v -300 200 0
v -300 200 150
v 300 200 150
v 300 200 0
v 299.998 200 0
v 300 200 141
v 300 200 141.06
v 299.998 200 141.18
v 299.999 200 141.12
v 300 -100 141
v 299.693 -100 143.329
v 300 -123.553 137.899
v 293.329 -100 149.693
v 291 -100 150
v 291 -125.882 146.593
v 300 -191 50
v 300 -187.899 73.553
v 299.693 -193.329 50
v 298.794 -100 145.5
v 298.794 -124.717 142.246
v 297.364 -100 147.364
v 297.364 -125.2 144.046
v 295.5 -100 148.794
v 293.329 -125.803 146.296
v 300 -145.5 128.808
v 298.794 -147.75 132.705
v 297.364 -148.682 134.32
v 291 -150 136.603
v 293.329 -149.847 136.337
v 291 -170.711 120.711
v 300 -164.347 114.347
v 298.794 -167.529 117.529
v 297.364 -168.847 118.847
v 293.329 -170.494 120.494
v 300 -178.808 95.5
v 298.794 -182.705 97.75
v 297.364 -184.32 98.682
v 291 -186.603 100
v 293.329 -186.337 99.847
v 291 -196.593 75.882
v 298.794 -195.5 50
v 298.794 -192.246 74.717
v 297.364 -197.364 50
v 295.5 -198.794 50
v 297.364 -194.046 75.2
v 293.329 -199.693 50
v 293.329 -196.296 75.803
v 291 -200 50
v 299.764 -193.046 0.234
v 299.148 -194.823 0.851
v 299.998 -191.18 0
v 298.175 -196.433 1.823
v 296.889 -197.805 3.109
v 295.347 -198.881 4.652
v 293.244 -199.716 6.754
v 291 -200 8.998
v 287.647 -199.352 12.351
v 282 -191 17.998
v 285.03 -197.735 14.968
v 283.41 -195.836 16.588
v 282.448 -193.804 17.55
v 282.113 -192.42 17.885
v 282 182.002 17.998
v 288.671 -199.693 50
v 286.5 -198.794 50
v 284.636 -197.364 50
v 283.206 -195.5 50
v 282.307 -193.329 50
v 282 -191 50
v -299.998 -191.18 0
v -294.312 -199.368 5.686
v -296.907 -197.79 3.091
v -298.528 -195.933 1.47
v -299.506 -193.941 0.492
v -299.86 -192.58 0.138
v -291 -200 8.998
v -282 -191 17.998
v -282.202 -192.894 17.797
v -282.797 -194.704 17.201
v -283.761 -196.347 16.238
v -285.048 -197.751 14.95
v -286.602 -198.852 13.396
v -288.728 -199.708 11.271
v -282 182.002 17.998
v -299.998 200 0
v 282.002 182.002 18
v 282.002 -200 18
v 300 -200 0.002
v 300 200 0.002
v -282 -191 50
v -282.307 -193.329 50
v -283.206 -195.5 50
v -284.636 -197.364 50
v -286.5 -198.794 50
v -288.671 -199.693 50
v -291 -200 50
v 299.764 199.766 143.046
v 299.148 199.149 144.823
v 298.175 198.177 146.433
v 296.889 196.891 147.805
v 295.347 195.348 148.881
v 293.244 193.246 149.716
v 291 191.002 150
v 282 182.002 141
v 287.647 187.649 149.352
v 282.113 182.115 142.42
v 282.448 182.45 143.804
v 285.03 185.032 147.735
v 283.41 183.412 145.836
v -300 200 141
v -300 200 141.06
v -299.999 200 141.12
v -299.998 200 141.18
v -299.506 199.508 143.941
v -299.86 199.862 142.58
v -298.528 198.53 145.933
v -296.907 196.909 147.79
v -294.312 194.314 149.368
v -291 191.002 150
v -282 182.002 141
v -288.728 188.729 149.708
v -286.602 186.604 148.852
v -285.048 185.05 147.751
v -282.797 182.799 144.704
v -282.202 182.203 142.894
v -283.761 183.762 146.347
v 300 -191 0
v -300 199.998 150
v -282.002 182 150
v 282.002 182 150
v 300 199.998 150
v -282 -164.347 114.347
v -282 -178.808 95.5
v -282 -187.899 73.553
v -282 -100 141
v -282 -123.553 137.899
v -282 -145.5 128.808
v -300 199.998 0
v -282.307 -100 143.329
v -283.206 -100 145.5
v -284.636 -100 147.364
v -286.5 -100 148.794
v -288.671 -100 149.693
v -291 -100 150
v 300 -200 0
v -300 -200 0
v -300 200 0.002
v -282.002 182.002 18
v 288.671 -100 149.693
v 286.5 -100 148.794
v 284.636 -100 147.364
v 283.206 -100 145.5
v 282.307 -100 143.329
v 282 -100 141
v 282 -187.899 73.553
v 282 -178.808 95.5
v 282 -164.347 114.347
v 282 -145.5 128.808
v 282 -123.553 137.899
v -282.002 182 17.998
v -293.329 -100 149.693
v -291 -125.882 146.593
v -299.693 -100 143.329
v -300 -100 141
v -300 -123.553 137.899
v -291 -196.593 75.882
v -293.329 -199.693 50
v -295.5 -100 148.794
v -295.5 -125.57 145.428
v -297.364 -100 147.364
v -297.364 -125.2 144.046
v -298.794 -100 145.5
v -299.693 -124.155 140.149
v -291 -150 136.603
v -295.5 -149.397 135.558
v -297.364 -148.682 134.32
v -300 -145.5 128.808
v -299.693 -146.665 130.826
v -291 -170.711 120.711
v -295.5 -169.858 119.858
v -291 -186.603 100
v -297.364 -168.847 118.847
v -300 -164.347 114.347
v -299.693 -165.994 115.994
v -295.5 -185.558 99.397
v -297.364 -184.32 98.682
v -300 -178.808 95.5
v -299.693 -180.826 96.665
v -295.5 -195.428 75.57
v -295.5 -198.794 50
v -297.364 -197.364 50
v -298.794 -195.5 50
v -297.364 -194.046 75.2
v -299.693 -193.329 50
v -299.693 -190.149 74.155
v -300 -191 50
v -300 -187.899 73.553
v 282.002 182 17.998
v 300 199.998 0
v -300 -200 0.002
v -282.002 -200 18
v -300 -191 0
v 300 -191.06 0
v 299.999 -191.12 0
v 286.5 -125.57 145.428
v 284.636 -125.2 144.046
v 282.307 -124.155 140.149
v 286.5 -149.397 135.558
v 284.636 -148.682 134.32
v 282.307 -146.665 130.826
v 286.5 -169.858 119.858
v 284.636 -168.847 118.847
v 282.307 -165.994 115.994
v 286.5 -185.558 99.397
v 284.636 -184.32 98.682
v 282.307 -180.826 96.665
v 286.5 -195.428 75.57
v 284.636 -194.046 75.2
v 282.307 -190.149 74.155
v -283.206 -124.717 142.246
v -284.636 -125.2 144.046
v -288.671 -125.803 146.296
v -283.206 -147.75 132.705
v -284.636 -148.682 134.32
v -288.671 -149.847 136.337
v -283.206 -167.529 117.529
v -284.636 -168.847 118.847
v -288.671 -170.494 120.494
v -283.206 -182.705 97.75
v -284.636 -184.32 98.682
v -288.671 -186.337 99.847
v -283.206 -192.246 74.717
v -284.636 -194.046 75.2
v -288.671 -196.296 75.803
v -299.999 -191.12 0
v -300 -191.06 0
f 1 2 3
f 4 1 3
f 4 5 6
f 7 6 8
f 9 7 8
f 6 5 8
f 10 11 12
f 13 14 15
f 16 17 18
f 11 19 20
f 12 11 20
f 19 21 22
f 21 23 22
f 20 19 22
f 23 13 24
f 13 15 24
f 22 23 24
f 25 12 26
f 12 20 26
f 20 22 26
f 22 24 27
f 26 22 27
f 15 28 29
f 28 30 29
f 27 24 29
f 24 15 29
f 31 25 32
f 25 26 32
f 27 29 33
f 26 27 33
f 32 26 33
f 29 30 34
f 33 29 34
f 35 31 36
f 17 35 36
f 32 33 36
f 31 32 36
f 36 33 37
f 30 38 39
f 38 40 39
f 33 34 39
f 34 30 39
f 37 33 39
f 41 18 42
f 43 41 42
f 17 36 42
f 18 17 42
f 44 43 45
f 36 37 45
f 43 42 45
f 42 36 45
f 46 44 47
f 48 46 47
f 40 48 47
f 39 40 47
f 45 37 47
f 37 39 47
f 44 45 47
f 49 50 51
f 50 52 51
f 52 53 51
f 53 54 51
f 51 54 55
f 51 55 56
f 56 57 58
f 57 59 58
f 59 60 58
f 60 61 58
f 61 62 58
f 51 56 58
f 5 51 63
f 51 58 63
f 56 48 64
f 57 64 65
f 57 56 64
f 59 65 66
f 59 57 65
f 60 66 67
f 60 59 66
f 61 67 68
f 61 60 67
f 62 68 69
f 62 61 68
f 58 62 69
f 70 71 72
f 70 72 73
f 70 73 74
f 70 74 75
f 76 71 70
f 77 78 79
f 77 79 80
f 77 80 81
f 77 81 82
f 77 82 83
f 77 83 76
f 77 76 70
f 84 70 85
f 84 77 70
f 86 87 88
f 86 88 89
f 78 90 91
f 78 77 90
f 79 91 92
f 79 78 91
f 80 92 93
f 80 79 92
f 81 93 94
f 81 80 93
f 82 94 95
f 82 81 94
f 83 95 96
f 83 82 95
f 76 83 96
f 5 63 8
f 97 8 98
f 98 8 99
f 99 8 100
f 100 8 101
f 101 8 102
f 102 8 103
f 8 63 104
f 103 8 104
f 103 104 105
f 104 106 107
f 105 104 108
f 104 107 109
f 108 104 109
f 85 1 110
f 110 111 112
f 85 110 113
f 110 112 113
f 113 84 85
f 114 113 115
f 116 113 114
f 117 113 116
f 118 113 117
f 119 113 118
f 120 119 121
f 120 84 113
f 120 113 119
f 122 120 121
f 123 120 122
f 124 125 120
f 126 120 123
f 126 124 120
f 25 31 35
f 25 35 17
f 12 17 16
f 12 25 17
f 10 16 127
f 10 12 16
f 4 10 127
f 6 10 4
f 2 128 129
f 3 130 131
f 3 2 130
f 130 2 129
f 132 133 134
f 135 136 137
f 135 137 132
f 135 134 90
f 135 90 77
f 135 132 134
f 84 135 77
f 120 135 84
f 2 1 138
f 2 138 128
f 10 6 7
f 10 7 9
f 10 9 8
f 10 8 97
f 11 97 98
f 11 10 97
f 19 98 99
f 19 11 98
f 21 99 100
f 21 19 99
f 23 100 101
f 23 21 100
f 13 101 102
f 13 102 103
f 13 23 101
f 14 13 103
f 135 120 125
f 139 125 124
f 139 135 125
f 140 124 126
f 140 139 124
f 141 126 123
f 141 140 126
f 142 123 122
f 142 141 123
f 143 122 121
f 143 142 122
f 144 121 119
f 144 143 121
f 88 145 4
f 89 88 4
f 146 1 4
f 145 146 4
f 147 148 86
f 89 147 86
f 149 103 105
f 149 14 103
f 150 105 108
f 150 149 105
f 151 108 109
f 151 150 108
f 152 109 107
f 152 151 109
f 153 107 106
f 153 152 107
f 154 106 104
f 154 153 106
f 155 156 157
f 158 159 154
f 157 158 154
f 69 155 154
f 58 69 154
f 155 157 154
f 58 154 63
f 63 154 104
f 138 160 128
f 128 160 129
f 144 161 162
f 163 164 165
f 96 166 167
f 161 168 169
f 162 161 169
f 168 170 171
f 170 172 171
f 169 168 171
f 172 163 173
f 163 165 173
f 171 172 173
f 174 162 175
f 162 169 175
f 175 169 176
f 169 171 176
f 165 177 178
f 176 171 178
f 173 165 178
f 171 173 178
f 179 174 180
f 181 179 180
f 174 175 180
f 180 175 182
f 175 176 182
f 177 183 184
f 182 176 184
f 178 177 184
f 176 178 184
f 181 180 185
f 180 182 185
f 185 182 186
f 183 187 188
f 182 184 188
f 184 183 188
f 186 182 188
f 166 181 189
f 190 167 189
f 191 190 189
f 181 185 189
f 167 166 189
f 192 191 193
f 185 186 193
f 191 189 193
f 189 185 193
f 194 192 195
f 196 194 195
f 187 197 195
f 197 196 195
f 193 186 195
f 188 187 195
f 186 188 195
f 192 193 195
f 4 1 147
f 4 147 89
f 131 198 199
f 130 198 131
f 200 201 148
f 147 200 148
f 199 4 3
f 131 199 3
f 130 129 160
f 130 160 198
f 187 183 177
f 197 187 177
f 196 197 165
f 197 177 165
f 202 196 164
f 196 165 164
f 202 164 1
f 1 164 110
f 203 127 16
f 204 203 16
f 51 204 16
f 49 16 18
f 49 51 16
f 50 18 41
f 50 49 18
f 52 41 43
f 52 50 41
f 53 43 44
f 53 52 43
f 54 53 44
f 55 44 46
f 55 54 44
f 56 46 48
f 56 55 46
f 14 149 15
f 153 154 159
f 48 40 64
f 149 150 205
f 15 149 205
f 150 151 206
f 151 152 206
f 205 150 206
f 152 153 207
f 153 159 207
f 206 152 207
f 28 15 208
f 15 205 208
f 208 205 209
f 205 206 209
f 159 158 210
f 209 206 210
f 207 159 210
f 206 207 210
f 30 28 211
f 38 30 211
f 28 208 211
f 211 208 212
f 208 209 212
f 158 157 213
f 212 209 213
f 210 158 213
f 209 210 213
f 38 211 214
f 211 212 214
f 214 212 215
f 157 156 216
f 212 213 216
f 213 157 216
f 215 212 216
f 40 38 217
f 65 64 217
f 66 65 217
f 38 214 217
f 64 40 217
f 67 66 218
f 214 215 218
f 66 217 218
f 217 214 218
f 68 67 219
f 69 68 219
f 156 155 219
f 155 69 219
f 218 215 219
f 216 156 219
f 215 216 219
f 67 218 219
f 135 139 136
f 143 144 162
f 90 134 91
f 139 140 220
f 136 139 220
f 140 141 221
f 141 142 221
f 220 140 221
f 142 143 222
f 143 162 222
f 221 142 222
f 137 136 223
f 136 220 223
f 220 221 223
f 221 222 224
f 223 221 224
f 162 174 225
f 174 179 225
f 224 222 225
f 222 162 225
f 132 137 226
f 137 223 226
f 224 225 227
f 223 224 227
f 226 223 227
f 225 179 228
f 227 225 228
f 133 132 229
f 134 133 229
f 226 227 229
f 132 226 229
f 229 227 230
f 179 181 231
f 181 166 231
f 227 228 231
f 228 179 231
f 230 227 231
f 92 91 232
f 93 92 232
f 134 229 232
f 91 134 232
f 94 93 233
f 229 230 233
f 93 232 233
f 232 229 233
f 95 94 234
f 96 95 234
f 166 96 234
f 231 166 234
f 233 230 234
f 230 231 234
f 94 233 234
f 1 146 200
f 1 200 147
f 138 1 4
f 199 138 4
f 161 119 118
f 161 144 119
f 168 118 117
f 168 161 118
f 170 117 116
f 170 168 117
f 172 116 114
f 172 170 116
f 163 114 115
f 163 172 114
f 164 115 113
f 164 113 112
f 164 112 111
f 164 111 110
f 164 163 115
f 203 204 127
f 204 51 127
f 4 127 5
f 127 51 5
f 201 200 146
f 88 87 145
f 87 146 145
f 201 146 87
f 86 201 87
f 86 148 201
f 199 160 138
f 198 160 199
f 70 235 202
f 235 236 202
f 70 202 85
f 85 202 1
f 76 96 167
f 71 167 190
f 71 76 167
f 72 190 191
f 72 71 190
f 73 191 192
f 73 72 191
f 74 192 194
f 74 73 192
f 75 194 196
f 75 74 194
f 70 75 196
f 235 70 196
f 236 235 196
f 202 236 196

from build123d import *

# Parameters (mm, degrees)
SKETCH_W        = 600
SKETCH_H        = 400
PAD_DEPTH       = 18
CHAMFER_SIZE    = 17.9982
PAD001_DEPTH    = 18
CHAMFER001_SIZE = 17.9982
FILLET_R        = 8.99991
PAD002_DEPTH    = 18
CHAMFER002_SIZE = 17.9982
FILLET001_R     = 8.99991
SKETCH003_W     = 600
SKETCH003_H     = 150
PAD003_DEPTH    = 18
CHAMFER003_SIZE = 17.9982


with BuildPart() as base:
    # Sketch → Pad (new body)
    with BuildSketch(Plane.XY):
        Rectangle(SKETCH_W, SKETCH_H)
    extrude(amount=PAD_DEPTH)

    # Chamfer
    chamfer_edges = [base.edges().sort_by_distance(p)[0] for p in [
        (0, 200, 18),
        (300, 0, 18),
        (-300, 0, 18),
    ]]
    chamfer(chamfer_edges, length=CHAMFER_SIZE)


with BuildPart() as left:
    # Sketch001 → Pad001 (new body)
    with BuildSketch(Plane.YZ):
        with BuildLine():
            Line((-200, 50), (-200, 0))
            Line((-200, 0), (200, 0))
            Line((200, 0), (200, 150))
            Line((200, 150), (-100, 150))
            ThreePointArc((-100, 150), (-170.710678, 120.710678), (-200, 50))
        make_face()
    extrude(amount=PAD001_DEPTH)

    # Chamfer001
    chamfer001_edges = [left.edges().sort_by_distance(p)[0] for p in [
        (18, 200, 75),
        (18, 0, 0),
    ]]
    chamfer(chamfer001_edges, length=CHAMFER001_SIZE)

    # Fillet
    fillet_edges = [left.edges().sort_by_distance(p)[0] for p in [
        (18, -170.710678, 120.710678),
        (18, 41.0009, 150),
        (0, -200, 25),
        (0, -170.710678, 120.710678),
        (0, 50, 150),
    ]]
    fillet(fillet_edges, radius=FILLET_R)


with BuildPart() as left_1:
    # Body001 placement: moved
    add(left.part.moved(Location((-300, 0, 0))))


with BuildPart() as right:
    # Sketch002 → Pad002 (new body)
    with BuildSketch(Plane.YZ):
        with BuildLine():
            Line((-200, 50), (-200, 0))
            Line((-200, 0), (200, 0))
            Line((200, 0), (200, 150))
            Line((200, 150), (-100, 150))
            ThreePointArc((-100, 150), (-170.710678, 120.710678), (-200, 50))
        make_face()
    extrude(amount=PAD002_DEPTH)

    # Chamfer002
    chamfer002_edges = [right.edges().sort_by_distance(p)[0] for p in [
        (0, 200, 75),
        (0, 0, 0),
    ]]
    chamfer(chamfer002_edges, length=CHAMFER002_SIZE)

    # Fillet001
    fillet001_edges = [right.edges().sort_by_distance(p)[0] for p in [
        (18, 50, 150),
        (0, -200, 33.9991),
        (0, 41.0009, 150),
    ]]
    fillet(fillet001_edges, radius=FILLET001_R)


with BuildPart() as right_1:
    # Body002 placement: moved
    add(right.part.moved(Location((282, 0, 0))))


with BuildPart() as back:
    # Sketch003 → Pad003 (new body)
    with BuildSketch(Plane.XZ):
        with Locations((0, 75)):
            Rectangle(SKETCH003_W, SKETCH003_H)
    extrude(amount=PAD003_DEPTH)

    # Chamfer003
    chamfer003_edges = [back.edges().sort_by_distance(p)[0] for p in [
        (-300, -18, 75),
        (0, -18, 0),
        (300, -18, 75),
    ]]
    chamfer(chamfer003_edges, length=CHAMFER003_SIZE)


with BuildPart() as back_1:
    # Body003 placement: moved
    add(back.part.moved(Location((0, 200, 0))))


solid = Compound([base.part, left_1.part, right_1.part, back_1.part])
